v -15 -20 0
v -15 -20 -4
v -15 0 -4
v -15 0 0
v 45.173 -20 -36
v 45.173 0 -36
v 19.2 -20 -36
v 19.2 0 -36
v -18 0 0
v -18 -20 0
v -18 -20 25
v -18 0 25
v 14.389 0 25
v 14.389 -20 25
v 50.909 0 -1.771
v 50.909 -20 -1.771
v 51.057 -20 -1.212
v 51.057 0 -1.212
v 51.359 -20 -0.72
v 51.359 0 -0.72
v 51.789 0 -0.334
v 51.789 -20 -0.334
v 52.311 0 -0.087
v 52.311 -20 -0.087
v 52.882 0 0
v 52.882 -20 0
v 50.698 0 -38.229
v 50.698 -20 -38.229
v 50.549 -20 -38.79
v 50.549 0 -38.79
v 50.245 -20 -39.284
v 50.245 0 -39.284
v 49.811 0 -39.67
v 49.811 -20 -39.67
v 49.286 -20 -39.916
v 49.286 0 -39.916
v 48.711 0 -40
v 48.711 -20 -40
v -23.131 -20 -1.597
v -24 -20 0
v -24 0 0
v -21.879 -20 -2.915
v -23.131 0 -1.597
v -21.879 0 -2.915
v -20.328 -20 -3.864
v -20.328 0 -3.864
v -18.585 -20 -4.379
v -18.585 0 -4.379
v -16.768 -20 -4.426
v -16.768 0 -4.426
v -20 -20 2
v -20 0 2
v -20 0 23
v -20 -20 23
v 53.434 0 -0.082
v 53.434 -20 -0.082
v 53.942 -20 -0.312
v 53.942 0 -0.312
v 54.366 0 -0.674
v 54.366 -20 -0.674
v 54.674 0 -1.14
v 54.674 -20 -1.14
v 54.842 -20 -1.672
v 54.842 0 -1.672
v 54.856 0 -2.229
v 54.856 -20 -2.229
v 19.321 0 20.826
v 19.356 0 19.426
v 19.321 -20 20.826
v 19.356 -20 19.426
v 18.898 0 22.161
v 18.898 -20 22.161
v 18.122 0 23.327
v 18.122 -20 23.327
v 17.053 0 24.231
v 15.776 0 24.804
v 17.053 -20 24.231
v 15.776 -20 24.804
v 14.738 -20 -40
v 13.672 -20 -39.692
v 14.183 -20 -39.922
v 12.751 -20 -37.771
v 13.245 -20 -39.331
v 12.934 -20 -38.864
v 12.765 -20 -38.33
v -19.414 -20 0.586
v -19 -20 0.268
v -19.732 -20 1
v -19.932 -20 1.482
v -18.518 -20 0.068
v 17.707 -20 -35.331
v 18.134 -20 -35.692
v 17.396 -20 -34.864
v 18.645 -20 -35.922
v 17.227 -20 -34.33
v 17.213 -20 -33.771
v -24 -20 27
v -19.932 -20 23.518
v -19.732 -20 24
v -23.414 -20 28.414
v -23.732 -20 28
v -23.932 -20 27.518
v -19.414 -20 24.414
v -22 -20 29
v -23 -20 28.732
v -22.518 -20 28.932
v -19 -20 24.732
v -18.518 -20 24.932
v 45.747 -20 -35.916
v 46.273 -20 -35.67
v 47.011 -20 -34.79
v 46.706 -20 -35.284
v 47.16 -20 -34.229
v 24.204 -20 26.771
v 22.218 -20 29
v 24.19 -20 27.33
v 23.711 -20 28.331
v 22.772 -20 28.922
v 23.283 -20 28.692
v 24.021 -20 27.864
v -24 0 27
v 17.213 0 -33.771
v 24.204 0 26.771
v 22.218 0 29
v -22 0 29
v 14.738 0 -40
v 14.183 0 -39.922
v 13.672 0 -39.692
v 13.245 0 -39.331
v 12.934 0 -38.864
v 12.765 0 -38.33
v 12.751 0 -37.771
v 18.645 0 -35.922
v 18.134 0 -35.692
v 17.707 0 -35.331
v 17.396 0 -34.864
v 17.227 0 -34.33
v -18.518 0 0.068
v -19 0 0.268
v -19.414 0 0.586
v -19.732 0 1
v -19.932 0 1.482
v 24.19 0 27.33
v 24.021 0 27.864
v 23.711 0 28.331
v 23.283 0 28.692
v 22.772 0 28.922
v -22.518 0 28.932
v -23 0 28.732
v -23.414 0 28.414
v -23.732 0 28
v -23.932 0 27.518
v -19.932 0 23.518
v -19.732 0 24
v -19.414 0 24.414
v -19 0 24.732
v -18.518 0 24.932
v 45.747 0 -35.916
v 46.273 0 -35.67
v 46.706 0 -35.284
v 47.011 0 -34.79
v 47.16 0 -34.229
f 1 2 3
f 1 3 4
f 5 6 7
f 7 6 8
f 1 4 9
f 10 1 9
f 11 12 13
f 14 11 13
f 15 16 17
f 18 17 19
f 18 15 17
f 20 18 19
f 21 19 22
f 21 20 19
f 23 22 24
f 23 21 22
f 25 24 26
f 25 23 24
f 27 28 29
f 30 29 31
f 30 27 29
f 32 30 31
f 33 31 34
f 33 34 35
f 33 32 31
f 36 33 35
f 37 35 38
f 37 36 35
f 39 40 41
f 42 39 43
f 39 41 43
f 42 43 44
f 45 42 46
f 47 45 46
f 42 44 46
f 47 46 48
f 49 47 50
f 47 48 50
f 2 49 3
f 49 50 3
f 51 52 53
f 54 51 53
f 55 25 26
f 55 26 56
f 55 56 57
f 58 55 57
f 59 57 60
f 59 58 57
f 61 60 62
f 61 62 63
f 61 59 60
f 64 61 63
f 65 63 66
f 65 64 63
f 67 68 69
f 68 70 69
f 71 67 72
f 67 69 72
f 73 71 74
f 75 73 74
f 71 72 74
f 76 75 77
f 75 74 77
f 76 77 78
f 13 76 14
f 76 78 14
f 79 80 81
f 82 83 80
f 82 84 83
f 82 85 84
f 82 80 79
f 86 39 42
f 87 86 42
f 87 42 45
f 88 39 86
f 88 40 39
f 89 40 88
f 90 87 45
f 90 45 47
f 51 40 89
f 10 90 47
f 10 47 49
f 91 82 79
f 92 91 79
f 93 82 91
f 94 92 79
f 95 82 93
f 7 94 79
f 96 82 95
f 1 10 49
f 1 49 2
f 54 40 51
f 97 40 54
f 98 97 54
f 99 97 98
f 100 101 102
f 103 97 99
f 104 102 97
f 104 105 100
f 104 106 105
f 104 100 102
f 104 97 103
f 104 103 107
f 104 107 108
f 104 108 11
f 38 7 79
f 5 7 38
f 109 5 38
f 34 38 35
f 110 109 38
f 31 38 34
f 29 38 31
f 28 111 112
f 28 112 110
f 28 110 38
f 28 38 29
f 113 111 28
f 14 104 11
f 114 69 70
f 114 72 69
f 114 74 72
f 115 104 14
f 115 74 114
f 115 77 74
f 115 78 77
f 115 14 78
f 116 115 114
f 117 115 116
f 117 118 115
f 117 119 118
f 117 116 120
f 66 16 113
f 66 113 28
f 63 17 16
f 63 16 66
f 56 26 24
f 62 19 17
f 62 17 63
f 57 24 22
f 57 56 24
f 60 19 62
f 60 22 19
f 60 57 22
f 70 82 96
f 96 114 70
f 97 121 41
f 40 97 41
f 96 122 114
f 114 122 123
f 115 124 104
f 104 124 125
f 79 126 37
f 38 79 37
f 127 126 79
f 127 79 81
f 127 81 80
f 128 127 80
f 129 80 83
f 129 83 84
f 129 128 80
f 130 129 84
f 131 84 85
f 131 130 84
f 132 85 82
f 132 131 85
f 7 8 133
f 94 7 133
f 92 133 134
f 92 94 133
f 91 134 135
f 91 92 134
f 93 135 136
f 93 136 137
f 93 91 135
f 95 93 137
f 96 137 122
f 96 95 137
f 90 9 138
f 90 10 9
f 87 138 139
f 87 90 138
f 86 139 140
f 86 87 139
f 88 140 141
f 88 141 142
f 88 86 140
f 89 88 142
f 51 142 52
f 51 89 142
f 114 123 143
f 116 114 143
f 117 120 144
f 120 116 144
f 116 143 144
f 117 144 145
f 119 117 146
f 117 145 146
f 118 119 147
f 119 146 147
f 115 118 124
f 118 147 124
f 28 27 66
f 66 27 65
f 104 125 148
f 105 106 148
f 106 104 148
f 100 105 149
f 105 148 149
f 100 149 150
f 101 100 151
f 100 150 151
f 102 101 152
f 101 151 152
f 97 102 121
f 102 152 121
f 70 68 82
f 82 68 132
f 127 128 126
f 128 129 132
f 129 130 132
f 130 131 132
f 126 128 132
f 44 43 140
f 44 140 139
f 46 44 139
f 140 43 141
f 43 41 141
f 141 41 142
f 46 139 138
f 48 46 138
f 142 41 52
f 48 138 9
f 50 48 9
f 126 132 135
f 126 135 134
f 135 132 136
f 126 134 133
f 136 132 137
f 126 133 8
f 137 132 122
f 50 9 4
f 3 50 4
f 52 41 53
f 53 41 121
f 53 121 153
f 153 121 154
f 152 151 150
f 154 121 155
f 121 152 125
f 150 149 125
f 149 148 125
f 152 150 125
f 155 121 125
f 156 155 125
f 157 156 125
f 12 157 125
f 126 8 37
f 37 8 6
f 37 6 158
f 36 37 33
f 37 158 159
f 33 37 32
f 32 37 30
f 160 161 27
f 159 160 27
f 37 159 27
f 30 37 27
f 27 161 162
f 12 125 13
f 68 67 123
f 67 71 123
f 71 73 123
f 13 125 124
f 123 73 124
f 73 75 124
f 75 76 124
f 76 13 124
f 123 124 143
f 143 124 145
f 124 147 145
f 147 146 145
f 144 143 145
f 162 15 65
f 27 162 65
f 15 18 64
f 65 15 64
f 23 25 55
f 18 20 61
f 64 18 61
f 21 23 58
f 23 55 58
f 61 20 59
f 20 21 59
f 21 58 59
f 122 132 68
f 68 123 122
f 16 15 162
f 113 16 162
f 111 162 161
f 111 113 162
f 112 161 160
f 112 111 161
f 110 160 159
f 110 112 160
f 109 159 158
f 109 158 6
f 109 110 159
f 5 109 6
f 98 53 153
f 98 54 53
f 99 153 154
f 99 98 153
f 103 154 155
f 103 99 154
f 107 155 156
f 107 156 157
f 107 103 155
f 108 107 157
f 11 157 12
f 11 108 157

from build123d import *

# Parameters (mm, degrees)
F1_DEPTH    = 20
F2_R        = 2
F3_T1_DEPTH = 30
F3_T3_DEPTH = 31.2212666506
F3_T5_DEPTH = 28.9116499156
F4_R        = 5


# Not quite as in the source:
# - a fillet or chamfer that OpenCascade refuses, or shapes differently, is made with other operations: its cross-section is extruded or revolved along the edge and cut away or added


with BuildPart() as f1:
    # F0 (on Front) → F1 (new body)
    with BuildSketch(Plane.XZ):
        Polygon((-24, 29), (-24, 0), (-20, 0), (-20, 25), (20, 25), (12.4937456114, -40), (50.4937456114, -40), (55.1129790813, 0), (51.1129790813, 0), (46.9556689583, -36), (16.9556689583, -36), (24.461923347, 29), align=None)
        with BuildLine():
            Line((-20, 0), (-24, 0))
            ThreePointArc((-24, 0), (-20.3284271247, -3.8639610307), (-15, -4))
            Line((-15, -4), (-15, 0))
            Line((-15, 0), (-20, 0))
        make_face()
    extrude(amount=F1_DEPTH)

    # F2
    f2_edges = [f1.edges().sort_by_distance(p)[0] for p in [
        (-20, -10, 0),
        (-20, -10, 25),
        (16.955669, -10, -36),
        (46.955669, -10, -36),
    ]]
    fillet(f2_edges, radius=F2_R)

    # F3: fillet of radius 2 on 6 edges, made by hand

    # F3_s2 → F3_t1 (cut)
    with BuildSketch(Plane.XZ.offset(-5)):
        with BuildLine():
            ThreePointArc((-22, 29), (-23.4142135624, 28.4142135624), (-24, 27))
            Line((-24, 27), (-24, 29))
            Line((-24, 29), (-22, 29))
        make_face()
    extrude(amount=F3_T1_DEPTH, mode=Mode.SUBTRACT)

    # F3_s4 → F3_t3 (cut)
    with BuildSketch(Plane.XZ.offset(-5.6106333253)):
        with BuildLine():
            ThreePointArc((24.2044661111, 26.7705631246), (23.7107999092, 28.3306250879), (22.2176700169, 29))
            Line((22.2176700169, 29), (24.461923347, 29))
            Line((24.461923347, 29), (24.2044661111, 26.7705631246))
        make_face()
        with BuildLine():
            ThreePointArc((14.7379989415, -40), (13.2448690491, -39.3306250879), (12.7512028472, -37.7705631246))
            Line((12.7512028472, -37.7705631246), (12.4937456114, -40))
            Line((12.4937456114, -40), (14.7379989415, -40))
        make_face()
        with BuildLine():
            ThreePointArc((52.8687257512, 0), (54.3618556435, -0.6693749121), (54.8555218454, -2.2294368754))
            Line((54.8555218454, -2.2294368754), (55.1129790813, 0))
            Line((55.1129790813, 0), (52.8687257512, 0))
        make_face()
    extrude(amount=F3_T3_DEPTH, mode=Mode.SUBTRACT)

    # F3_s6 → F3_t5 (cut)
    with BuildSketch(Plane.XZ.offset(-4.4558249578)):
        with BuildLine():
            ThreePointArc((50.6982117225, -38.2294368754), (50.0420407161, -39.4931298923), (48.7114156282, -40))
            Line((48.7114156282, -40), (50.4937456114, -40))
            Line((50.4937456114, -40), (50.6982117225, -38.2294368754))
        make_face()
        with BuildLine():
            ThreePointArc((50.9085129701, -1.7705631246), (51.5646839765, -0.5068701077), (52.8953090644, 0))
            Line((52.8953090644, 0), (51.1129790813, 0))
            Line((51.1129790813, 0), (50.9085129701, -1.7705631246))
        make_face()
    extrude(amount=F3_T5_DEPTH, mode=Mode.SUBTRACT)

    # F4
    f4_edges = [f1.edges().sort_by_distance(p)[0] for p in [
        (20, -10, 25),
    ]]
    fillet(f4_edges, radius=F4_R)


solid = f1.part
